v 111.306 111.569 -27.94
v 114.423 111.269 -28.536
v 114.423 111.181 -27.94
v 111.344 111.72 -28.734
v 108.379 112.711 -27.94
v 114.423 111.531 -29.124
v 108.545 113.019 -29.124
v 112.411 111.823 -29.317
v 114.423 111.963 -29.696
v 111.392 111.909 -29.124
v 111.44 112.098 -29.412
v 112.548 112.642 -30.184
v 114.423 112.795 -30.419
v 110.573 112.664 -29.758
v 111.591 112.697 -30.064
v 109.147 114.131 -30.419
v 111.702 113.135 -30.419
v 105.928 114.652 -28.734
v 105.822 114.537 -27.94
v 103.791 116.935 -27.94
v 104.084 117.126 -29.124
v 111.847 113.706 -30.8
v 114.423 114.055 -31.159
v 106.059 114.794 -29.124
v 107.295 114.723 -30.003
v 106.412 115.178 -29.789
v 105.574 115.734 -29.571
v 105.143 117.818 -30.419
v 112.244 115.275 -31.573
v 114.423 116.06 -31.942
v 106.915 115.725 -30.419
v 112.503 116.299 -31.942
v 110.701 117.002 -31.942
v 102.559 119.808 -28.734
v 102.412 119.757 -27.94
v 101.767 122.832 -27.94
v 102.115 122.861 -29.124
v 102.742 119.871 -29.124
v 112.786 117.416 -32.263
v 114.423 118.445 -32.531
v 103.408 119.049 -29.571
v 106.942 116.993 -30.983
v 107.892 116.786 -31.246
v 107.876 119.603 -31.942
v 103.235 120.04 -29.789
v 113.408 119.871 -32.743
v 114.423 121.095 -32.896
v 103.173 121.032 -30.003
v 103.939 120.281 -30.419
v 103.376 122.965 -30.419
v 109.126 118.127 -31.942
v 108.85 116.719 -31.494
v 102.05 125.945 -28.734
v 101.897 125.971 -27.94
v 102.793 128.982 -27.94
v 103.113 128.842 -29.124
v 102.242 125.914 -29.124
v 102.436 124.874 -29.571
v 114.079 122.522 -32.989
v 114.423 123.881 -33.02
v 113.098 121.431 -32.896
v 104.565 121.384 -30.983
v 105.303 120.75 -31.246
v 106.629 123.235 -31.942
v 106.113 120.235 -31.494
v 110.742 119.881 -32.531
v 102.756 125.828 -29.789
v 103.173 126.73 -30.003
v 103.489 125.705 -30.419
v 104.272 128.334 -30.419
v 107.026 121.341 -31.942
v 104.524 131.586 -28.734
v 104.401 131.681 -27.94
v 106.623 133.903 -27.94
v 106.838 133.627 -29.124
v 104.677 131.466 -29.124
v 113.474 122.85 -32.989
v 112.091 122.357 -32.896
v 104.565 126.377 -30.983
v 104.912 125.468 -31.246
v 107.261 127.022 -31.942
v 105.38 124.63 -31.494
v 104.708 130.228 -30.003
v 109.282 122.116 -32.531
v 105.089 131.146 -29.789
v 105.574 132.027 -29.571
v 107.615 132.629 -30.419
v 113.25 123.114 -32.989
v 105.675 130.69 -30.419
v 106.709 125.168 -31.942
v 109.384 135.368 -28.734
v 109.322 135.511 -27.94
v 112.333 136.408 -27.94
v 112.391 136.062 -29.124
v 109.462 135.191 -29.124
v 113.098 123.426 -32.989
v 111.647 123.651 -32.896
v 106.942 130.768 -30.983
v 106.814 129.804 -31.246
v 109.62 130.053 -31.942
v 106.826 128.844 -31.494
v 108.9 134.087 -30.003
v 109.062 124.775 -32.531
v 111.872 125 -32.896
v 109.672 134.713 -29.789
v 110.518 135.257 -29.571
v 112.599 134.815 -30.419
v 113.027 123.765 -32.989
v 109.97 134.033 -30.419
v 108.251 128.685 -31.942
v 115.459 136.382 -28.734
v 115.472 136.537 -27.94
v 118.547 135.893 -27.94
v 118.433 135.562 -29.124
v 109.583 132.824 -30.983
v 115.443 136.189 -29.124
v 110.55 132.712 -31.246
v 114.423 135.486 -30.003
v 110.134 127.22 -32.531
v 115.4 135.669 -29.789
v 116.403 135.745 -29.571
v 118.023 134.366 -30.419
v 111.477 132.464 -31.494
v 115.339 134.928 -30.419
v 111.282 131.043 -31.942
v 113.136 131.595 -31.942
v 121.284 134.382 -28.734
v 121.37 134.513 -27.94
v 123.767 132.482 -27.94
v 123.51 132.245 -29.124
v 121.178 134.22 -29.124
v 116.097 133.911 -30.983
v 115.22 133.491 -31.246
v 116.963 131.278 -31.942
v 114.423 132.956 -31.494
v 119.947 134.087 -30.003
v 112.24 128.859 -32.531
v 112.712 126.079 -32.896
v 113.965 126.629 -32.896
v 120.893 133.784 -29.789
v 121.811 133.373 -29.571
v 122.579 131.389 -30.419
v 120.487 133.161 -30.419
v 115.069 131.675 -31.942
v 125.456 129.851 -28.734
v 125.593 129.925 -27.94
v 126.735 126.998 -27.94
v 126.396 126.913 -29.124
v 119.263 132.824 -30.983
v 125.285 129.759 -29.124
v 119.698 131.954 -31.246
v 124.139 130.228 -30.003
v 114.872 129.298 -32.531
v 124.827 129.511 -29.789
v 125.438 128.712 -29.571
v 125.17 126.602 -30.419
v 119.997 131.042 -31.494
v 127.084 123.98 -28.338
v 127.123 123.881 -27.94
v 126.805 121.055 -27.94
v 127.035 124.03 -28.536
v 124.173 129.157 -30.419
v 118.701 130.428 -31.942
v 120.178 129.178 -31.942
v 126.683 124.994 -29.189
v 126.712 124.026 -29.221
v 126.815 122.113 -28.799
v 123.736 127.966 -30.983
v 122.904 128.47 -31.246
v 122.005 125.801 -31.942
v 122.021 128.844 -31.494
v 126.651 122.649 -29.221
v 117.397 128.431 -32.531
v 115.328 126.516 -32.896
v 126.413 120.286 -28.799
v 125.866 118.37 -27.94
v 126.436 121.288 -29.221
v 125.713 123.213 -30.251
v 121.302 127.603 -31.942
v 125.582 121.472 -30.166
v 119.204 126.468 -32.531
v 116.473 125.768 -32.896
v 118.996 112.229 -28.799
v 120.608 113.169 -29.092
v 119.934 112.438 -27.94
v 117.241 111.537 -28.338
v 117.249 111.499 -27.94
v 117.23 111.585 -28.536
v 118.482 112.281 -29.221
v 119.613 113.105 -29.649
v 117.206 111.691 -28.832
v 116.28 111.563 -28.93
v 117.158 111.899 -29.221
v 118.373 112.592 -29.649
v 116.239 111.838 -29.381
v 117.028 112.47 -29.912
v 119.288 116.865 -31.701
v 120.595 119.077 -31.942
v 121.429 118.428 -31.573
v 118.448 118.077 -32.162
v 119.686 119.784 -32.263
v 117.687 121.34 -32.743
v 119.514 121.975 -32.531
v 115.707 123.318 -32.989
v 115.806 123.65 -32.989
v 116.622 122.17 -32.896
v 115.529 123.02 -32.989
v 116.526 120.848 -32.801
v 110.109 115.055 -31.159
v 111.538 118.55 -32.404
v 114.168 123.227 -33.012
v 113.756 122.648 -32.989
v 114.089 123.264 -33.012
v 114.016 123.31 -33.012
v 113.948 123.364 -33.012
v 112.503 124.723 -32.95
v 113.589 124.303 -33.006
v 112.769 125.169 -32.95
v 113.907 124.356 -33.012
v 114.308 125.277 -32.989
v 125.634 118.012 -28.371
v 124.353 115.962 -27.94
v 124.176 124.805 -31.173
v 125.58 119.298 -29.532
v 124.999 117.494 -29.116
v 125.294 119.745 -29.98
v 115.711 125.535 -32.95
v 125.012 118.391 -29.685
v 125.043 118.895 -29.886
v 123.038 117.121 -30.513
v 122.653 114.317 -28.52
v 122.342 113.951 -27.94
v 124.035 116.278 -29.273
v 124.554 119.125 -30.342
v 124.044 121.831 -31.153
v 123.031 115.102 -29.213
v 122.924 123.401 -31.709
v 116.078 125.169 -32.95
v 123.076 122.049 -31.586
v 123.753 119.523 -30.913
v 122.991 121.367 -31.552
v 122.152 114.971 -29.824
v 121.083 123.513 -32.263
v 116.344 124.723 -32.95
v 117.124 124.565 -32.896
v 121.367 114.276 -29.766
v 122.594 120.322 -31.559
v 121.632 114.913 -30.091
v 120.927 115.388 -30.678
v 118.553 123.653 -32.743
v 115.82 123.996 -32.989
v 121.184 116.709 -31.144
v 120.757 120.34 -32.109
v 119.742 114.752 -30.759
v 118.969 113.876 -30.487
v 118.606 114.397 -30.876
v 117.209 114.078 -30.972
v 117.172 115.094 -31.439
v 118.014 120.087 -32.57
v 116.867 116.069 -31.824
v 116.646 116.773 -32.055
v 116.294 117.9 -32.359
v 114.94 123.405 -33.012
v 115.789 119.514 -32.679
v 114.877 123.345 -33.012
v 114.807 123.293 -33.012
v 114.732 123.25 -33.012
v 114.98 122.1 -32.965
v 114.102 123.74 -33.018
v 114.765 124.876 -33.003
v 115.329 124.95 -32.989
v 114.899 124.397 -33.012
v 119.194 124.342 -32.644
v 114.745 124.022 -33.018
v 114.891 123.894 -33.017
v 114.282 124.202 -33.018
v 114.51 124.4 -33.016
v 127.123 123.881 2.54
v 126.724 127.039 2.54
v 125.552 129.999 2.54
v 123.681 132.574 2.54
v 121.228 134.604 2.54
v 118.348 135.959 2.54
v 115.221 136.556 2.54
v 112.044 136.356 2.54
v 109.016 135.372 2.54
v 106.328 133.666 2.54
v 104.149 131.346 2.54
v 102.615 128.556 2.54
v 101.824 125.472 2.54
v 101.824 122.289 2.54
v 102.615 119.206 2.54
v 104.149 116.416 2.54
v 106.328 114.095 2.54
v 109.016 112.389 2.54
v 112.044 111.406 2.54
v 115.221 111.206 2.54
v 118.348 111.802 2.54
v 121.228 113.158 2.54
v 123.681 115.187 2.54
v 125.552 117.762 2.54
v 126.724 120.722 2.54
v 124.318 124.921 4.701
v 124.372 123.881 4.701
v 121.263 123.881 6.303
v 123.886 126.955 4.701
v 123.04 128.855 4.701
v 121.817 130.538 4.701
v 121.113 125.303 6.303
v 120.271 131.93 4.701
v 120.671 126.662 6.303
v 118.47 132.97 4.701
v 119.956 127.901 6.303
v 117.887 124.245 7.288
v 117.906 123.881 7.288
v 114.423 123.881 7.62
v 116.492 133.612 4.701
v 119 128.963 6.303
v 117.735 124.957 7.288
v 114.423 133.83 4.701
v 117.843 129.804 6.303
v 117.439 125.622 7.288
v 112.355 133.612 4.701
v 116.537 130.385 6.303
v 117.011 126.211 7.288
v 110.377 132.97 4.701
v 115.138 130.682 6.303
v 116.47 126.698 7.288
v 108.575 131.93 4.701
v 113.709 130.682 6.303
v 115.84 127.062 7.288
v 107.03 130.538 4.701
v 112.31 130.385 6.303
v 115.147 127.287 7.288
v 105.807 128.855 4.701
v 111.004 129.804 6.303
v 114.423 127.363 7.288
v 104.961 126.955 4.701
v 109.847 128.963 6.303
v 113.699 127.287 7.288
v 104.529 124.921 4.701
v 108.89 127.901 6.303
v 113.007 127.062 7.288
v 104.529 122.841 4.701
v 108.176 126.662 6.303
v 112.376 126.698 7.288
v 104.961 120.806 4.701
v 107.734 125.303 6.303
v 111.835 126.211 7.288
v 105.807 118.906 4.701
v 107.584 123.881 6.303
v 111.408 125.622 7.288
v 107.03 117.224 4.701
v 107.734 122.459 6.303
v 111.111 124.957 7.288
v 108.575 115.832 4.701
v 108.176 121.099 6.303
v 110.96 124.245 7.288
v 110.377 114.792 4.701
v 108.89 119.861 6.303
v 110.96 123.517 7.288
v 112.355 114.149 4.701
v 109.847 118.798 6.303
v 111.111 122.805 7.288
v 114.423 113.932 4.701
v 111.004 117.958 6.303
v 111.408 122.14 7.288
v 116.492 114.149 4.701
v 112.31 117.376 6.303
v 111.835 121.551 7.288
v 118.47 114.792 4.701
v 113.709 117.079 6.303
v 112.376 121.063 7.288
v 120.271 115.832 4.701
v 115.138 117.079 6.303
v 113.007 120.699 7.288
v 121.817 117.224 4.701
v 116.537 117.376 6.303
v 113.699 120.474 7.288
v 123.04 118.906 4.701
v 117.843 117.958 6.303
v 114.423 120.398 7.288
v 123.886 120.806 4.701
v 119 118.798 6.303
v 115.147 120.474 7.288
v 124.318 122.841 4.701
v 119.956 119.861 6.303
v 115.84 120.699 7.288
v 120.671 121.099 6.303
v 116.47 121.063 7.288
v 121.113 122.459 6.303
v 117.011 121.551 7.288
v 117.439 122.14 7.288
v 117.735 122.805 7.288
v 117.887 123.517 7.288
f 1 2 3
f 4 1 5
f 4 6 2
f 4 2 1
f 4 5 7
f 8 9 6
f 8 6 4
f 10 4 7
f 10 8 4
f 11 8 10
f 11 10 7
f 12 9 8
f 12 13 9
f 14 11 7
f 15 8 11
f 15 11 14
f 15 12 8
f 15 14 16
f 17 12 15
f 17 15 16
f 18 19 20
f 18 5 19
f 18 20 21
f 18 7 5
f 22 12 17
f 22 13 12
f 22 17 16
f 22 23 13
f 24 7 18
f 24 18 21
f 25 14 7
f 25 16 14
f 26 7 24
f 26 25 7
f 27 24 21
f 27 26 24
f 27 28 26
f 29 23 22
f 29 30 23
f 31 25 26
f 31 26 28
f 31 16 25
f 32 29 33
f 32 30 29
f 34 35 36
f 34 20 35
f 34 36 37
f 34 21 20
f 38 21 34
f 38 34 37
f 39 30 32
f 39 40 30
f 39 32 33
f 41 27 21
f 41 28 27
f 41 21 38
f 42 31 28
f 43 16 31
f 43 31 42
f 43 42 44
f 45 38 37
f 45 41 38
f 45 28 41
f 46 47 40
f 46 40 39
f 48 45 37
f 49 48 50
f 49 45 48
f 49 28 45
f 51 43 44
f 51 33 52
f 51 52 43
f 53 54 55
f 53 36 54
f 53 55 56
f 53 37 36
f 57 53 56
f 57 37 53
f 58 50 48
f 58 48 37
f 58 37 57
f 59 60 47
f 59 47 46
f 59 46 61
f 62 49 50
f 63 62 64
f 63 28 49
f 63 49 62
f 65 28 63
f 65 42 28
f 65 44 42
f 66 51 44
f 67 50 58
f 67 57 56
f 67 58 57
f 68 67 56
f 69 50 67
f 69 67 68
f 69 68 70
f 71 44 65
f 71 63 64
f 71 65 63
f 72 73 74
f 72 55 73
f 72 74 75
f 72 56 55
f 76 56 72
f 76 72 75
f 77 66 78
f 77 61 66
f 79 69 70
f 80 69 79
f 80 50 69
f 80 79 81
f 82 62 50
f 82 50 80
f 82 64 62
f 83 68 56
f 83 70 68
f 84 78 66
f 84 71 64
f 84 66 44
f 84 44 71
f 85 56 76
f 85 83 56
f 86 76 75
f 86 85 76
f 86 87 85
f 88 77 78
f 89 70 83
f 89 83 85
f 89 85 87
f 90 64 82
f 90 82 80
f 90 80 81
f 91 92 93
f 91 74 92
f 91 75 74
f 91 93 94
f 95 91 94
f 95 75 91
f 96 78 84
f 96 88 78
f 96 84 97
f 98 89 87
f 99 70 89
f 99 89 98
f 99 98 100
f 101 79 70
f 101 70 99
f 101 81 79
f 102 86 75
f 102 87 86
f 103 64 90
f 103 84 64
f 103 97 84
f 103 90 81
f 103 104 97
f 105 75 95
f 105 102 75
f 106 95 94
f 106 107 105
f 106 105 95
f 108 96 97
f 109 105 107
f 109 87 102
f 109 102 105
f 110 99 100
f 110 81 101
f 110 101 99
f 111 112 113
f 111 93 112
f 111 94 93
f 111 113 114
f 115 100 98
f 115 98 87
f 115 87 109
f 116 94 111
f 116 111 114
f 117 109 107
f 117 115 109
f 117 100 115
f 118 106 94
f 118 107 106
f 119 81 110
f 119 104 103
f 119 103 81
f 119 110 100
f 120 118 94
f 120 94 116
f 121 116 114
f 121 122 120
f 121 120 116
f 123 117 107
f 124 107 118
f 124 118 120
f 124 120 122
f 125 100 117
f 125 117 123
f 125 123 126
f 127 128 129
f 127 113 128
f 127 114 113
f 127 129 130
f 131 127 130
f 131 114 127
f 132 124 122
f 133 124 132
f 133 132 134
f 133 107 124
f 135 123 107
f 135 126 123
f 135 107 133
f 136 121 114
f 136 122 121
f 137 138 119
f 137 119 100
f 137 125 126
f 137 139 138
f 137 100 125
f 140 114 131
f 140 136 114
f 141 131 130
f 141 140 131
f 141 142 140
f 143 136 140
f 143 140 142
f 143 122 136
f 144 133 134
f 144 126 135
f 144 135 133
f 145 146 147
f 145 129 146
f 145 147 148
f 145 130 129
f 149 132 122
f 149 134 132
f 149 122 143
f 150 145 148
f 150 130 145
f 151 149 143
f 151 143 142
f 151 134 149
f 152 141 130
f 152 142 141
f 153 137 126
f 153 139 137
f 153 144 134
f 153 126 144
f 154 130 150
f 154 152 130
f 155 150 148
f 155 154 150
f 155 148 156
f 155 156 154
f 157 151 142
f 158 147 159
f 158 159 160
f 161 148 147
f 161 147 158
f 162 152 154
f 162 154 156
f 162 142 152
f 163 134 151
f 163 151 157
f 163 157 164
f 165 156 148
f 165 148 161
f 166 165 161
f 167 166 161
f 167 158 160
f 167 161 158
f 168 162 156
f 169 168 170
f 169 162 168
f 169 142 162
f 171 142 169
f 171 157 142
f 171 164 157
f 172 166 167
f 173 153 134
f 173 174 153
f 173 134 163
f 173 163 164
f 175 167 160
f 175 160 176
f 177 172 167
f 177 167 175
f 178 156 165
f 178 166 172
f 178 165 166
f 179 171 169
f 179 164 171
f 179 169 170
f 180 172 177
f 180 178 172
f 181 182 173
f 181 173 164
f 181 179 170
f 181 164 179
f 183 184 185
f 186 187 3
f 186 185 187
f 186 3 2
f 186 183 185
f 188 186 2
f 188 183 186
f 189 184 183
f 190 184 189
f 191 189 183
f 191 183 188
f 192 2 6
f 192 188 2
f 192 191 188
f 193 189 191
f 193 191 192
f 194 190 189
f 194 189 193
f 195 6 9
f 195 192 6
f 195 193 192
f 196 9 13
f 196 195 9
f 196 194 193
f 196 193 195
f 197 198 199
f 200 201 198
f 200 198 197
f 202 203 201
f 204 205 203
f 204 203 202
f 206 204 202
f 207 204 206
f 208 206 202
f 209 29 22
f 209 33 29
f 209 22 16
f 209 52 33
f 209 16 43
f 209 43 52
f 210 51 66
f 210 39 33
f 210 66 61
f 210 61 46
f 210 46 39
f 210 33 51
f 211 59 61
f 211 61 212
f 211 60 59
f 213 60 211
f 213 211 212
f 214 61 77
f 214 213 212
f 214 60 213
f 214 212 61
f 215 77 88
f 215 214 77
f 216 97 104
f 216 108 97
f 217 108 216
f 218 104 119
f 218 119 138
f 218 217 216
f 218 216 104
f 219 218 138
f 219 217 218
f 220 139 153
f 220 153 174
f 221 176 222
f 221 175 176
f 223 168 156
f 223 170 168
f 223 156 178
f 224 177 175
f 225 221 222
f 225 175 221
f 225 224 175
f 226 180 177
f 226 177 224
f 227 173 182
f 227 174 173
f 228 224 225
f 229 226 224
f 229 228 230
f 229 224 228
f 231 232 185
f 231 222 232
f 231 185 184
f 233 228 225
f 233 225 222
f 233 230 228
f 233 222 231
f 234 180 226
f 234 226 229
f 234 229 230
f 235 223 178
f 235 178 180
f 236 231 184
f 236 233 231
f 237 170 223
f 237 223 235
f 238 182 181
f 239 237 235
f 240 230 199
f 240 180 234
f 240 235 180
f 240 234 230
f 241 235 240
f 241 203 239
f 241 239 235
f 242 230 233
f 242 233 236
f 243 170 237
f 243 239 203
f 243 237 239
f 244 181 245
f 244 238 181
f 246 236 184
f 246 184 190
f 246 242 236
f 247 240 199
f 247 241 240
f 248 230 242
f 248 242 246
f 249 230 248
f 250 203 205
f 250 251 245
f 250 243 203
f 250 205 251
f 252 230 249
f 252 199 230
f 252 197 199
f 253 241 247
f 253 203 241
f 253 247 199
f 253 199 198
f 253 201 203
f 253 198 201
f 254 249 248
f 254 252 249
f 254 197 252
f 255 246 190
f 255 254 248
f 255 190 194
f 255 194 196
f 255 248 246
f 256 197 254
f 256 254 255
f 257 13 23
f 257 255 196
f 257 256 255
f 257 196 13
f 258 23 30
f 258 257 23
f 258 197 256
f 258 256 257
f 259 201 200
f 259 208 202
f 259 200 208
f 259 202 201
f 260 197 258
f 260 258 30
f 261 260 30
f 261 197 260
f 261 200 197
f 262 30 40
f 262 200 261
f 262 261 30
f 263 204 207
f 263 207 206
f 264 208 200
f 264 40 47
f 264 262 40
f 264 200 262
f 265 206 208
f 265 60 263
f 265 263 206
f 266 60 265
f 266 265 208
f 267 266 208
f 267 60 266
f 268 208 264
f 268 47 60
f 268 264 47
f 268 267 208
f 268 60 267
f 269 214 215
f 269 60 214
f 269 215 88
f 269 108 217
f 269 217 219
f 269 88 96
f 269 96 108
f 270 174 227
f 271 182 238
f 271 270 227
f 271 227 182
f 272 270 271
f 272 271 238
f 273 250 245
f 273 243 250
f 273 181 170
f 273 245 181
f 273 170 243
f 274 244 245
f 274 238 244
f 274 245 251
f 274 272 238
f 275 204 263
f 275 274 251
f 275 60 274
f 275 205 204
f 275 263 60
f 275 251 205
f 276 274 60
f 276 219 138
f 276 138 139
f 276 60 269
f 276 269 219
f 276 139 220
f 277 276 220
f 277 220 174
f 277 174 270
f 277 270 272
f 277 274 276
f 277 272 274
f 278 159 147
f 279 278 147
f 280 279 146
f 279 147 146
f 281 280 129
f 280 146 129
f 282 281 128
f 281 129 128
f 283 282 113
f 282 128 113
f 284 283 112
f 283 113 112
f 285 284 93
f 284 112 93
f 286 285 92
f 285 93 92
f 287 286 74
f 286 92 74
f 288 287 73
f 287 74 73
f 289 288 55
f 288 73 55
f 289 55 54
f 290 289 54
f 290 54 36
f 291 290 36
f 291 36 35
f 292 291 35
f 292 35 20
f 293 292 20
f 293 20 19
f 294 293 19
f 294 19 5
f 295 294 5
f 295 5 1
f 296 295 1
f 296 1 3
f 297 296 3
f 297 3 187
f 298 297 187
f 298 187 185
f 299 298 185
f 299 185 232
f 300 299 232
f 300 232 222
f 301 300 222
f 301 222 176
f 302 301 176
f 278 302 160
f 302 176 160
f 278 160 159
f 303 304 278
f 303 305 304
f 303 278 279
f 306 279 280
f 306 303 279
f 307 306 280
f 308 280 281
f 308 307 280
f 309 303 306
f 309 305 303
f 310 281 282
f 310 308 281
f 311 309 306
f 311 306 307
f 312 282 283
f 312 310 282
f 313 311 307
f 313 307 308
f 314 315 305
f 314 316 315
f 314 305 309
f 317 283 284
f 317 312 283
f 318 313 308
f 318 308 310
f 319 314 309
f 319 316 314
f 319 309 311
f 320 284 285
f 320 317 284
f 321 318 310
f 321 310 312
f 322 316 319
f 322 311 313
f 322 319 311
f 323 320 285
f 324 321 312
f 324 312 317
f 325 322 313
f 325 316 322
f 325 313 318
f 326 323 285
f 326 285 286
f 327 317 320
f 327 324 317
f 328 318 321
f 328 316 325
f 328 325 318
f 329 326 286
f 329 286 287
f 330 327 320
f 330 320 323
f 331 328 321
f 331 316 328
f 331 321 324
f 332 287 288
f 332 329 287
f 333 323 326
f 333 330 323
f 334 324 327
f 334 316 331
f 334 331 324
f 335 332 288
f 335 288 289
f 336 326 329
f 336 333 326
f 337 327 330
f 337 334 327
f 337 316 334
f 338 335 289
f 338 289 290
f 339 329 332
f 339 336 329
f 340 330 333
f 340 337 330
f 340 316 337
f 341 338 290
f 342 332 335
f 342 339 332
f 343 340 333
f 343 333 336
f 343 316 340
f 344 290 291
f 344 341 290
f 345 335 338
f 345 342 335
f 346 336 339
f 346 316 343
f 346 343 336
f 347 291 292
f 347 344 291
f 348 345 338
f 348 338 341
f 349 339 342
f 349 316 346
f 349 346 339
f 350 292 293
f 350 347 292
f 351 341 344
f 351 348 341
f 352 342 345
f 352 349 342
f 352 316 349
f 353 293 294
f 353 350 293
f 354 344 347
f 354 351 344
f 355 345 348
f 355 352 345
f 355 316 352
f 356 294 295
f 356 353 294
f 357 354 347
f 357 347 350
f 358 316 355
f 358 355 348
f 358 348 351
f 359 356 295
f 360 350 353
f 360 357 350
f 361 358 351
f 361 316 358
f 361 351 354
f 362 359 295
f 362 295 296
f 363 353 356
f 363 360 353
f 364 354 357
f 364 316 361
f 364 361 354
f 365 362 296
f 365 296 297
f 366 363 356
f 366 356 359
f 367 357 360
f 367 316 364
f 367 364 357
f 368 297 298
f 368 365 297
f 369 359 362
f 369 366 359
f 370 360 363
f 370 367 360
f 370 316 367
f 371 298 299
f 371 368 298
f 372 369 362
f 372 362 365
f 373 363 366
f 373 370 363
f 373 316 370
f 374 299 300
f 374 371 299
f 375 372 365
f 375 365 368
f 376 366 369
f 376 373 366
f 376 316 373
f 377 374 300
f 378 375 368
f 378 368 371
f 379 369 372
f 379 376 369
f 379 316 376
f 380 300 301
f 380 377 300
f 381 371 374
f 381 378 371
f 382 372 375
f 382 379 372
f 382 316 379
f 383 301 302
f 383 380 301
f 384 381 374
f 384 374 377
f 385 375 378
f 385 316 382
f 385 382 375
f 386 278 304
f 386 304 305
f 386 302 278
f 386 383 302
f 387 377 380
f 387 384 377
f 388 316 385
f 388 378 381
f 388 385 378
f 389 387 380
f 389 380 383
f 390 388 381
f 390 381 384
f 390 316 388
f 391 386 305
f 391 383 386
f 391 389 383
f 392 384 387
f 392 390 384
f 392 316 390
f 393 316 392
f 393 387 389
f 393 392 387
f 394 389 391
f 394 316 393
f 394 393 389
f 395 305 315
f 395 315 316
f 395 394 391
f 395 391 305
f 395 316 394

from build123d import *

# Parameters (mm, degrees)
BOSS_EXTRUDE1_DEPTH      = 2.54
BOSS_EXTRUDE1_DEPTH_BACK = 27.94
SKETCH1_R                = 12.7
DOME1_FACE_RADIUS        = 12.7
DOME1_HEIGHT             = 5.08
DOME2_FACE_RADIUS        = 12.7
DOME2_HEIGHT             = 5.08


with BuildPart() as part:
    # Sketch1 → Boss-Extrude1 (new, two sides: drawn at the far end of the back side and taken through both)
    with BuildSketch(Plane.XY.offset(-BOSS_EXTRUDE1_DEPTH_BACK)):
        with Locations((114.42340137, 123.880750733)):
            Circle(SKETCH1_R)
    extrude(amount=BOSS_EXTRUDE1_DEPTH + BOSS_EXTRUDE1_DEPTH_BACK)

    # Dome1: an elliptical dome of height H over a round flat face of radius A is half a spheroid: the quarter ellipse of half axes A and H revolved about the face's axis
    with BuildSketch(Plane((114.42340137, 123.880750733, -27.94), x_dir=(0, -1, 0), z_dir=(1, 0, 0)), mode=Mode.PRIVATE) as dome1_quarter:
        Ellipse(DOME1_FACE_RADIUS, DOME1_HEIGHT)
        Rectangle(DOME1_FACE_RADIUS, DOME1_HEIGHT, align=(Align.MIN, Align.MIN), mode=Mode.INTERSECT)
    revolve(dome1_quarter.sketch, axis=Axis((114.42340137, 123.880750733, -27.94), (0, 0, -1)))

    # Dome2: a dome of height H over a round flat face of radius A is a cap of a sphere of radius (A * A + H * H) / (2 * H)
    dome2_r = (DOME2_FACE_RADIUS * DOME2_FACE_RADIUS + DOME2_HEIGHT * DOME2_HEIGHT) / (2 * DOME2_HEIGHT)
    dome2_base = Plane((114.42340137, 123.880750733, 2.54), z_dir=(0, 0, 1))
    with Locations(dome2_base.offset(DOME2_HEIGHT - dome2_r)):
        dome2_ball = Sphere(dome2_r, mode=Mode.PRIVATE)
    add(split(dome2_ball, bisect_by=dome2_base, keep=Keep.TOP, mode=Mode.PRIVATE))


solid = part.part
